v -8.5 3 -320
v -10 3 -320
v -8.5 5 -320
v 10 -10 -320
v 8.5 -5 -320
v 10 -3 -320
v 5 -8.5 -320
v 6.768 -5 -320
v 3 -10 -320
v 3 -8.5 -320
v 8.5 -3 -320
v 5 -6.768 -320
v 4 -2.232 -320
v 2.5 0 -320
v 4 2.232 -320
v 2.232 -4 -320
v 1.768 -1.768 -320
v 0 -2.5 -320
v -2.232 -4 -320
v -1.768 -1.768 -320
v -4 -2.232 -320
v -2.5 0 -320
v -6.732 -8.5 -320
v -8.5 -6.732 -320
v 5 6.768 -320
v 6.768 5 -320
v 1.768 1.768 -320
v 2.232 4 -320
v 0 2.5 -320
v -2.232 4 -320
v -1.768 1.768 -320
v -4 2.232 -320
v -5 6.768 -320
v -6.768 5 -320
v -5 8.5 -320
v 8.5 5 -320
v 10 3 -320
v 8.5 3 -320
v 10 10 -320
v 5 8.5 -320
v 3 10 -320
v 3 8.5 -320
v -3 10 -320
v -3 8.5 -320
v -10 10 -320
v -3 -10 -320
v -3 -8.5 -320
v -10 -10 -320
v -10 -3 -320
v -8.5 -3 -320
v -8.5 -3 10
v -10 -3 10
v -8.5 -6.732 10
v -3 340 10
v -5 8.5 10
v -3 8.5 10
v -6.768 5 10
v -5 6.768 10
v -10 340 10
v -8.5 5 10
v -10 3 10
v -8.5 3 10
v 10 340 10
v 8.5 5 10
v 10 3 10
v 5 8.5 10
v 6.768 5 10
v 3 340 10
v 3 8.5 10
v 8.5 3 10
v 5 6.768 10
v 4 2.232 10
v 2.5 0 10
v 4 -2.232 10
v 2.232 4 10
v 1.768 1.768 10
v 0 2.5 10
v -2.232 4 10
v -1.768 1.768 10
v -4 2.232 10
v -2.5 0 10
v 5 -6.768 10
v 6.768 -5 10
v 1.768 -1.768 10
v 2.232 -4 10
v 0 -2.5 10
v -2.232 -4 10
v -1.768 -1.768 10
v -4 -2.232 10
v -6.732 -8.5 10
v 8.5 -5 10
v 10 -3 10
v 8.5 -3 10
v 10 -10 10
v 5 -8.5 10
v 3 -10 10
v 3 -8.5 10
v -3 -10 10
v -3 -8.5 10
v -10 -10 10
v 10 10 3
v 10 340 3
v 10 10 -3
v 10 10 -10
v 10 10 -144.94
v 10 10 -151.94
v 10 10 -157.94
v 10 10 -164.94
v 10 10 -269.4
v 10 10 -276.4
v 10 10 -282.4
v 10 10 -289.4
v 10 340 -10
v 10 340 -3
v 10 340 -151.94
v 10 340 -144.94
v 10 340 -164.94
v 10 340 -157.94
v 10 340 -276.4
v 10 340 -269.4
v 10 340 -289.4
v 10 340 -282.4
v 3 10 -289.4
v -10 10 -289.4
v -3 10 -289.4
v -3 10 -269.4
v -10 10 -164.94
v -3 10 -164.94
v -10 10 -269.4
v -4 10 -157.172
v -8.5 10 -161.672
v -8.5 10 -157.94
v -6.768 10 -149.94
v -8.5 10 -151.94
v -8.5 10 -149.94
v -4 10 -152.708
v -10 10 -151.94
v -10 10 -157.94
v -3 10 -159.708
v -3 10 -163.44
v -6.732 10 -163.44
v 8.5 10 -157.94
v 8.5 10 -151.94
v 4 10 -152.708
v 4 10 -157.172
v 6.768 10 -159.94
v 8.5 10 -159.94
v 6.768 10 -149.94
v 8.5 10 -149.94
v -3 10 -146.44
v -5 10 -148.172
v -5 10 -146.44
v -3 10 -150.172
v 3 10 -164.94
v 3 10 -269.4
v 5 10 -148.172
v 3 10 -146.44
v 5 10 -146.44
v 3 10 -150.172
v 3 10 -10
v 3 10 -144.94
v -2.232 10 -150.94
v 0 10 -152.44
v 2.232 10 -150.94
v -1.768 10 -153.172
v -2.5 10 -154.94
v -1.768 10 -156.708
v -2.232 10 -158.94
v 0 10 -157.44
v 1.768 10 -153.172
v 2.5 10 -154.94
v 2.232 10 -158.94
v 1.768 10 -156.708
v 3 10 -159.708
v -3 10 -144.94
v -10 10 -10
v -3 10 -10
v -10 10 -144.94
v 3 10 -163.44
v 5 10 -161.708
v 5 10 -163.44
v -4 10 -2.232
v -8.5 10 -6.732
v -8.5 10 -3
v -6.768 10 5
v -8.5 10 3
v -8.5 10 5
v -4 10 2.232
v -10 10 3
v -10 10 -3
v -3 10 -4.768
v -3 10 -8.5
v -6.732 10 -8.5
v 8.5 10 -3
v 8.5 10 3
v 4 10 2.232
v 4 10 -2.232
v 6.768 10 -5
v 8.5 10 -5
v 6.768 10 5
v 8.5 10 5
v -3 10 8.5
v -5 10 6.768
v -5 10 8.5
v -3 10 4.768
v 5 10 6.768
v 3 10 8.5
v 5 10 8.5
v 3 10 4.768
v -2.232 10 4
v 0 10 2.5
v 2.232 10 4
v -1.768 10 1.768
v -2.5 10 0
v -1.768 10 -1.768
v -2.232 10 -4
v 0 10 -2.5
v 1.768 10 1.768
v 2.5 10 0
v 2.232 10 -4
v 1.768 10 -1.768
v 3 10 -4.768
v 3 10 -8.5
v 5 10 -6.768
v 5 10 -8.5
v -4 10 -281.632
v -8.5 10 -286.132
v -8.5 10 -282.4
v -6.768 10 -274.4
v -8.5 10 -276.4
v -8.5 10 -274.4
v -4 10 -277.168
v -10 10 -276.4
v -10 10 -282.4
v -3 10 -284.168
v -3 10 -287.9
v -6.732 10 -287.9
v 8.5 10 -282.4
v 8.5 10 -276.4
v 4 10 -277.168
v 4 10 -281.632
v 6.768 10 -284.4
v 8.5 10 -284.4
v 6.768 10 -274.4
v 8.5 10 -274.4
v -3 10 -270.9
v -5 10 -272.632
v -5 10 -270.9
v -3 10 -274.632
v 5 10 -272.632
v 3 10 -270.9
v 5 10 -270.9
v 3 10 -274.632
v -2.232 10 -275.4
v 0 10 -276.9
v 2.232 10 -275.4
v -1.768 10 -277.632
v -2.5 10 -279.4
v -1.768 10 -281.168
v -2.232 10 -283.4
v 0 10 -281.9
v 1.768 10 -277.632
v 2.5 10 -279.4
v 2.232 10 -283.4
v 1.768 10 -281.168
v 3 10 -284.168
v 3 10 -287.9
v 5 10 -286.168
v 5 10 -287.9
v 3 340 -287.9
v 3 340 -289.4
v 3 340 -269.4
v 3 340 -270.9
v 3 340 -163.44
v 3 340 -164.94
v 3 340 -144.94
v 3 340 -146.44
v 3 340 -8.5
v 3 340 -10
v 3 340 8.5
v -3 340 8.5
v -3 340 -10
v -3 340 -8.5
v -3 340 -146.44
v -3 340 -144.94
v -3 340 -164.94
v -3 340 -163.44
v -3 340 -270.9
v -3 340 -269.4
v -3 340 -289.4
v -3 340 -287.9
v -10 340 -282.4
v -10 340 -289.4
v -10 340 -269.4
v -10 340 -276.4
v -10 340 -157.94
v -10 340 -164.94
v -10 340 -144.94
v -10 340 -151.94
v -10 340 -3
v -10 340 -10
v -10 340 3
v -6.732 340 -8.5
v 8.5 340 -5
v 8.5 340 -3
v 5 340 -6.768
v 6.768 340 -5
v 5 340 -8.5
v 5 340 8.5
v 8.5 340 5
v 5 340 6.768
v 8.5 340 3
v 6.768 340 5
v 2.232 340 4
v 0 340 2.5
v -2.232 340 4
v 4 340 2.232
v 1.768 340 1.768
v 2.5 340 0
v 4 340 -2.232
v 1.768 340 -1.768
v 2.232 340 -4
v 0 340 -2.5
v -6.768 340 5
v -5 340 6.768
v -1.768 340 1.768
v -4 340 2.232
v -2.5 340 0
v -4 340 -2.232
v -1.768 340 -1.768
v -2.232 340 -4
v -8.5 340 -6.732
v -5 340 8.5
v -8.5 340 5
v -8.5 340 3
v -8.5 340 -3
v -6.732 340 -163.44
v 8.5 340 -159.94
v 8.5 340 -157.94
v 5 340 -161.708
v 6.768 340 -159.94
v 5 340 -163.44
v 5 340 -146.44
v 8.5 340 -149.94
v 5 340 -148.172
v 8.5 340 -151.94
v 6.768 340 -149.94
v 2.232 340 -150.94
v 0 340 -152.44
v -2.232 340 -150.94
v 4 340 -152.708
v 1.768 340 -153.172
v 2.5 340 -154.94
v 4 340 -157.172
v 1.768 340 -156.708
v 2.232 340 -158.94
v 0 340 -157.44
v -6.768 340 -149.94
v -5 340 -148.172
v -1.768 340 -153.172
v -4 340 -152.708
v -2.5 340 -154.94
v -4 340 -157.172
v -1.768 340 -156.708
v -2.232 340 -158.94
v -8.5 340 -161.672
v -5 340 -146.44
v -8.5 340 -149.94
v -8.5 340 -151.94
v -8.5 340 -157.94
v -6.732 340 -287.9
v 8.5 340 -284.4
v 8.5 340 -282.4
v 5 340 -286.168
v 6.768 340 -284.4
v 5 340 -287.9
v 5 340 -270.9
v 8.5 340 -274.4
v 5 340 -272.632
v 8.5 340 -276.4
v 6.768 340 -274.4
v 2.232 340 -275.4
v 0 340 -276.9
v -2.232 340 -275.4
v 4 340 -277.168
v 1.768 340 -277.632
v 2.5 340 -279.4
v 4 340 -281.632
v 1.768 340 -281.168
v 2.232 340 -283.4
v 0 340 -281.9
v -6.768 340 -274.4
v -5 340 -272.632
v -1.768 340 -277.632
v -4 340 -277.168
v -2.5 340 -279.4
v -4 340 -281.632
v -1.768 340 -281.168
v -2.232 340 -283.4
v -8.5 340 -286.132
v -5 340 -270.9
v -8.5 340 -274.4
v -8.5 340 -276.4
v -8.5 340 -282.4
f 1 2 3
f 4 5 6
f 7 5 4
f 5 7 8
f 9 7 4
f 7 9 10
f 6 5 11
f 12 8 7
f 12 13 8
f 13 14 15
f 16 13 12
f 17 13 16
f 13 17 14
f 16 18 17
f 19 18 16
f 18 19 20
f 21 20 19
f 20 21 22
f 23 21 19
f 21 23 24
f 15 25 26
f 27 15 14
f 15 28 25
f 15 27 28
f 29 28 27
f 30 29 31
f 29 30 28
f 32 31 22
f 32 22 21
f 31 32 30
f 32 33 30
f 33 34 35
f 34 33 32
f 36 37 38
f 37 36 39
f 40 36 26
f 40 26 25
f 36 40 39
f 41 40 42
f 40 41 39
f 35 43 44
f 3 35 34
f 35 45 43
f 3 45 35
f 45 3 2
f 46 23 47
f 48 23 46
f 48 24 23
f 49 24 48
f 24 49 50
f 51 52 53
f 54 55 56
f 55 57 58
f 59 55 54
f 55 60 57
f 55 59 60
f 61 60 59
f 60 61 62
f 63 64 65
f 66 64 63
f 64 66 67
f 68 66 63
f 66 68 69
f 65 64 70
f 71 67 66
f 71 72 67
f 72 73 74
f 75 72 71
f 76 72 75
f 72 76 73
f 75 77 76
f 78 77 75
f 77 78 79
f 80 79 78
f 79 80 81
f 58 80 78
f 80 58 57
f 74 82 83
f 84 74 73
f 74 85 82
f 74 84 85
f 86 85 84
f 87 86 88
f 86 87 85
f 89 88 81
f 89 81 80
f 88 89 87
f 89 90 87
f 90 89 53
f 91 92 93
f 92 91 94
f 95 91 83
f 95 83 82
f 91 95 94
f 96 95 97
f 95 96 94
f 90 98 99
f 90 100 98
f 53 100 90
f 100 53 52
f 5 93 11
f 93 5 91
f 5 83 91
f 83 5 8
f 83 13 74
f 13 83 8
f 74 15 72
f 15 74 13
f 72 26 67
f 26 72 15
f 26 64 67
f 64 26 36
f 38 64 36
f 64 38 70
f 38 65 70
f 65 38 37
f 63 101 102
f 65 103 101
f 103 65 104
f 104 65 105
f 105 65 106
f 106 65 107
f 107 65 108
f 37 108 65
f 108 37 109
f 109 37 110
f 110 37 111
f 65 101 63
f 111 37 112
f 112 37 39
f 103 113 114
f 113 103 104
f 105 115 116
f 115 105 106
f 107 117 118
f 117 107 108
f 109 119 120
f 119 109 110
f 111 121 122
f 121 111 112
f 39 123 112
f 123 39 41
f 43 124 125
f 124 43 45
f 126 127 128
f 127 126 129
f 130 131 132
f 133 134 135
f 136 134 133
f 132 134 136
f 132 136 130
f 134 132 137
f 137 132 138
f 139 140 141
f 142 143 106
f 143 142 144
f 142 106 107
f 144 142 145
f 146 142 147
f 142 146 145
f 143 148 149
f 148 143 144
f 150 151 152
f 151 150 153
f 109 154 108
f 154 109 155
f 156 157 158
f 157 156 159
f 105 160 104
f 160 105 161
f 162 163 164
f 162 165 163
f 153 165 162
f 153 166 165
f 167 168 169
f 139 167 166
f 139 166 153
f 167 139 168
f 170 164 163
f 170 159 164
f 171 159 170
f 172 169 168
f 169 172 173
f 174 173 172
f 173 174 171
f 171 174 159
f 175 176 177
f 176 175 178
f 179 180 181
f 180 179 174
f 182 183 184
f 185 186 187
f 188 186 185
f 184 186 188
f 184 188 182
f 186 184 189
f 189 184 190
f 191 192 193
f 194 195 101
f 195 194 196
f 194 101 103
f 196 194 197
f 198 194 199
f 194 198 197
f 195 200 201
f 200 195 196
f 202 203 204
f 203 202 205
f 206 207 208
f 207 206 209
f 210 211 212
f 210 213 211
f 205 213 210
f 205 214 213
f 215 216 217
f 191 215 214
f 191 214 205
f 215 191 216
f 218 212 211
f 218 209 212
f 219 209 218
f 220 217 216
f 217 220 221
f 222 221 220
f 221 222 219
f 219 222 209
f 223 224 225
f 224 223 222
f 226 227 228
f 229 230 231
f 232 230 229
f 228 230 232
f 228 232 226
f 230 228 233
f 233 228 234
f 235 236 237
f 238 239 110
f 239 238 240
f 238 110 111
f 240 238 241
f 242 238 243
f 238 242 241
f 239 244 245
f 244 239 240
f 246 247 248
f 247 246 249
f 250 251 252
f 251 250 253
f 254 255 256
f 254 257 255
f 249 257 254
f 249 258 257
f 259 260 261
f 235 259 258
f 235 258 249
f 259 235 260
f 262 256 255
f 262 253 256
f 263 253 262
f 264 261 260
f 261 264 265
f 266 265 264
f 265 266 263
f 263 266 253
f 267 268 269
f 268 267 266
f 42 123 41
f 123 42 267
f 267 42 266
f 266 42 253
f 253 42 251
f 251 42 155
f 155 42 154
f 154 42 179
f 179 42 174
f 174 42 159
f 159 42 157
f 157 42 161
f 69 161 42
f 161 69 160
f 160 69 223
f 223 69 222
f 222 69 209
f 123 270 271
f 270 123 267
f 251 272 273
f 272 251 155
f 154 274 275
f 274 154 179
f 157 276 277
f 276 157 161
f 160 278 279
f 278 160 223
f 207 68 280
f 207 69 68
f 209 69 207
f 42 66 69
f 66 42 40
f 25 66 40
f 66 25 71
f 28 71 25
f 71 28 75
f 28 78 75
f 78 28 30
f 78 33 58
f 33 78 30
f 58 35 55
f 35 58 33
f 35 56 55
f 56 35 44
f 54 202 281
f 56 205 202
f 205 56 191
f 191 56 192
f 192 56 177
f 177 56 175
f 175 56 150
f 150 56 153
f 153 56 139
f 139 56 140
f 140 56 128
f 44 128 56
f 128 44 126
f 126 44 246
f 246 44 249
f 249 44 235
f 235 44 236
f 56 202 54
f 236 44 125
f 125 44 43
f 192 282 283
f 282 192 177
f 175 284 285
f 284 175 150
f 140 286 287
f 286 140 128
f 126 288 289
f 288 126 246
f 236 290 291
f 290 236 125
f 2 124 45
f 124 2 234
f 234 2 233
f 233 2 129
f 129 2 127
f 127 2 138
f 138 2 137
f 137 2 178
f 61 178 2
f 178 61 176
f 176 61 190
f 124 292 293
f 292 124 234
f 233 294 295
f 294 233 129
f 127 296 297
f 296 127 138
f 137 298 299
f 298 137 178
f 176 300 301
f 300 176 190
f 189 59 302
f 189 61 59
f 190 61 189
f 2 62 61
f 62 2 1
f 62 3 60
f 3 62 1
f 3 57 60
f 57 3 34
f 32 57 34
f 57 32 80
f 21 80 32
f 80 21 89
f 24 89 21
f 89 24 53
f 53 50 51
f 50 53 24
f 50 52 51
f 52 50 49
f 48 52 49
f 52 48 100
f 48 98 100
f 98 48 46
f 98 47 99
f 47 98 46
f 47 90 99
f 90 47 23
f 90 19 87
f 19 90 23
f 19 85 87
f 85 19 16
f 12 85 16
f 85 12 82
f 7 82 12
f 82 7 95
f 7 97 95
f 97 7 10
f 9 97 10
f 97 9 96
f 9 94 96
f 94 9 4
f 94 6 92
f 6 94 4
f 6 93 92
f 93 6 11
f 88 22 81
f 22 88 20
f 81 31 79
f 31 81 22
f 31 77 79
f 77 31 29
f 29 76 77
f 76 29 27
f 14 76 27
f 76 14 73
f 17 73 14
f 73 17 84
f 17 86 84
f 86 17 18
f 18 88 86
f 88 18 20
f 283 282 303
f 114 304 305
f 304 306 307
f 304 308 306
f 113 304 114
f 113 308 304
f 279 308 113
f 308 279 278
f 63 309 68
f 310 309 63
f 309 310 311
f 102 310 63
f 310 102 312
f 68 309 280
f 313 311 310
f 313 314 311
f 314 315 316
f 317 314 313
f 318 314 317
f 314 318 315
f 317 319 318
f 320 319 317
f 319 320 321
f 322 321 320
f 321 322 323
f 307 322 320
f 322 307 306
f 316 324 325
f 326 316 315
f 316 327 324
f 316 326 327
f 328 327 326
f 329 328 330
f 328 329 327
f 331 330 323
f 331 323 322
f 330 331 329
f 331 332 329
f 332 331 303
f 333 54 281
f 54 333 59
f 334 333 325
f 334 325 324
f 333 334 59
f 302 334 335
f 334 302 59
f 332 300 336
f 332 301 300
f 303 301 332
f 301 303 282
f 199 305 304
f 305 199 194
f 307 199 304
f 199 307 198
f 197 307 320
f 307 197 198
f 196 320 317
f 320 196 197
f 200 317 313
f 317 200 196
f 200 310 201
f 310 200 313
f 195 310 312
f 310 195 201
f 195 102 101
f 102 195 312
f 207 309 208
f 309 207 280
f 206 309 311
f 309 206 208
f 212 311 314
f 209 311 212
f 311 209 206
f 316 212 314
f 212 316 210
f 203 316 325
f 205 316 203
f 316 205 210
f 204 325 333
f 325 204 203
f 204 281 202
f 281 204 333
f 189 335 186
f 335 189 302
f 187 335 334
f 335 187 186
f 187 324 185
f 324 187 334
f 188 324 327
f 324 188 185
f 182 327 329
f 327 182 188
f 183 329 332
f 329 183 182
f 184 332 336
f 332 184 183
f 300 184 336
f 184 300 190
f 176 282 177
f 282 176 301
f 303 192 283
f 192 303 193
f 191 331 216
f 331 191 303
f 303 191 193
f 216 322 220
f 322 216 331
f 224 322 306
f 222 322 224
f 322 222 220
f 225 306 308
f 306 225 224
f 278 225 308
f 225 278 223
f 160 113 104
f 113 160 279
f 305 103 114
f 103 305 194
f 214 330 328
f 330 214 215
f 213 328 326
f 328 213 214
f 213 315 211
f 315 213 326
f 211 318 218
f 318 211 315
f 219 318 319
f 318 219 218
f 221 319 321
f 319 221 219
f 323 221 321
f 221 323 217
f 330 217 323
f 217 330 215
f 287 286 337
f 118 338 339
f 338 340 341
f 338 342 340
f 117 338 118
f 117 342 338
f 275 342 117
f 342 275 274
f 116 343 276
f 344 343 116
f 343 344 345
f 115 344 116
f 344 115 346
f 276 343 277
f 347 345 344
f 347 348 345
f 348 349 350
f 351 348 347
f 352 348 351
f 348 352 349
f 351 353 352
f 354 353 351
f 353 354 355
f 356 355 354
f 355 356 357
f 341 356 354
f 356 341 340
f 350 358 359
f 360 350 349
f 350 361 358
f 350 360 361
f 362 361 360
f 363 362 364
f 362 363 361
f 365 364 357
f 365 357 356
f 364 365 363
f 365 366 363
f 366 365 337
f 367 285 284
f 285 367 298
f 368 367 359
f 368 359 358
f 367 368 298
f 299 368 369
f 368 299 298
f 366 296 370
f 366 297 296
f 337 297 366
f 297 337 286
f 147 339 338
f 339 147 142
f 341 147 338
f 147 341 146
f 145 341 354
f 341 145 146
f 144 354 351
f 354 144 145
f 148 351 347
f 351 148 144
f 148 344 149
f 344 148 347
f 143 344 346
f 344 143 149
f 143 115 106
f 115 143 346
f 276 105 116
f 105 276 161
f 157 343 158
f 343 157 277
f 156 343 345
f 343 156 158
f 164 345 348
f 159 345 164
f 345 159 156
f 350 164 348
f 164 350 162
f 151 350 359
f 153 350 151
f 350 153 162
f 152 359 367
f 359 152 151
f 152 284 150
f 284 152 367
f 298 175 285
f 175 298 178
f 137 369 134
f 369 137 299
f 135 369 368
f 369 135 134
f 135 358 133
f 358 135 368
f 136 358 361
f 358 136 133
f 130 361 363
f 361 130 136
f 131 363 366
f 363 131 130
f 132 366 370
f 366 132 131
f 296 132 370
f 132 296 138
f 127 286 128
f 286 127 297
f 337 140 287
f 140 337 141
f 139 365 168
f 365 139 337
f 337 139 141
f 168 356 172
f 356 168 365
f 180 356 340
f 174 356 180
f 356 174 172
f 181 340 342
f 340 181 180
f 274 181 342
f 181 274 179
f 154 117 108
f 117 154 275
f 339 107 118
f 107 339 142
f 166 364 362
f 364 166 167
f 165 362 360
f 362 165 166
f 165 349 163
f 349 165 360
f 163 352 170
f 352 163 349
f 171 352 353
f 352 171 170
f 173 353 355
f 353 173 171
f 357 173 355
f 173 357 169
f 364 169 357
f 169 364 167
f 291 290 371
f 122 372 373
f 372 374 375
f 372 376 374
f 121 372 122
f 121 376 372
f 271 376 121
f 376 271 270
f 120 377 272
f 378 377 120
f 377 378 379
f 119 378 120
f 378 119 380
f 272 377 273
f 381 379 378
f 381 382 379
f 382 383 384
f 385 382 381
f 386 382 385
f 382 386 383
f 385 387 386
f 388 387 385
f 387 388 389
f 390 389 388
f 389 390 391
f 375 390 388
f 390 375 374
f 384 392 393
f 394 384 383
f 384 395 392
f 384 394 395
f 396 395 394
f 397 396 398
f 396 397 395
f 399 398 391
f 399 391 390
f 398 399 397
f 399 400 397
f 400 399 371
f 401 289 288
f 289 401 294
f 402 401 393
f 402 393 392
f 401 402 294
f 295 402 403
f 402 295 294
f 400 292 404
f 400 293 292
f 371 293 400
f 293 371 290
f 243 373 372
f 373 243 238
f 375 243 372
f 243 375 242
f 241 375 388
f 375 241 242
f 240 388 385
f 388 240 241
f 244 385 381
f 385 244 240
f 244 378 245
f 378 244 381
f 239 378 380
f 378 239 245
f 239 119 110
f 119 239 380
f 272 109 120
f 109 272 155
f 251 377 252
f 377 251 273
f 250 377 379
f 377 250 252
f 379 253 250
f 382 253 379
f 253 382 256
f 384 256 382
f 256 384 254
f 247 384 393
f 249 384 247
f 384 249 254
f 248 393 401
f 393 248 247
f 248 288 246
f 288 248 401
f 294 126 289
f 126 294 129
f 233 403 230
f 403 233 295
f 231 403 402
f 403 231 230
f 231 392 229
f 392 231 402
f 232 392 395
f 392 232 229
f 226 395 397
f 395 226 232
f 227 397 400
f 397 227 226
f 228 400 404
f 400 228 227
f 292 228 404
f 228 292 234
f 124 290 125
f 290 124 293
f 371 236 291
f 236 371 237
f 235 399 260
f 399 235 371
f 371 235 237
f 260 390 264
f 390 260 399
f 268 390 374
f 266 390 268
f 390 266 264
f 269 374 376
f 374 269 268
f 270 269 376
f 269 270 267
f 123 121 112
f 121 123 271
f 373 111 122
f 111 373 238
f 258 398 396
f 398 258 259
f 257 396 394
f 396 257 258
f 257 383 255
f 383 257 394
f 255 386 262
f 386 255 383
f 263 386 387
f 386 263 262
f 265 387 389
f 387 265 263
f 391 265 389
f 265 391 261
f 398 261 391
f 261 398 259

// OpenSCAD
// file: connectors.scad
module tslide(length, width, height, top_length, top_width, top_height,
              bottom_width, slope_height, screw_diameter, center = false) {
    module base() {
        rotate([90, 0, 90]) union() {
            linear_extrude(height = length) polygon(
                points =
                    [
                        // 0
                        [ width - (width - bottom_width) / 2, 0 ],
                        // 4
                        [ width, slope_height ],
                        // 8
                        [ width, height - top_height ],
                        // 11
                        [ 0, height - top_height ],
                        // 7
                        [ 0, slope_height ],
                        // 3
                        [ (width - bottom_width) / 2, 0 ]
                    ]);
            translate([0, 0, (length - top_length) / 2]) linear_extrude(height = top_length) polygon(
                points =
                    [
                        // 0
                        [
                            width - (width - top_width) / 2, 
                            height - top_height
                        ],
                        // 3
                        [
                            (width - top_width) / 2,
                            height - top_height
                        ],
                        // 7
                        [
                            (width - top_width) / 2,
                            height
                        ],
                        // 4
                        [
                            width - (width - top_width) / 2,
                            height
                        ]                        
                    ]
            );
        }
    }
    difference() {
        if (center) {
            translate([ -length / 2, -width / 2, -height / 2 ]) {
                base();
            }
        } else {
            base();
        }
        if (center) {
            cylinder(h = height, d = screw_diameter, center = true);
        } else {
            translate([ length / 2, width / 2, 0 ]) {
                cylinder(h = height, d = screw_diameter);
            }
        }
    }
}
// main file
include<extrusions.scad>

include<connectors.scad>

sidelen = 20;
notch = 6;
border_thickness = 1.5;
arm_thickness = 2.5;
center_diameter = 5;
center_sidelen = 8;
corner_inner = 0;
corner_outer = 5.0;

vchassie_len = 330;

translate([0, 0, -vchassie_len / 2 + sidelen / 2])
extrusion(sidelen = sidelen, height = vchassie_len, notch = notch,
                      border_thickness = border_thickness,
                      arm_thickness = arm_thickness,
                      center_diameter = center_diameter,
                      center_sidelen = center_sidelen,
                      corner_inner = corner_inner, corner_outer = corner_outer,
                      center = true);


hchassie_len = 330;

translate([ 0, hchassie_len / 2 + sidelen / 2, 0])
rotate([90, 0, 0])
extrusion(sidelen = sidelen, height = hchassie_len, notch = notch,
                      border_thickness = border_thickness,
                      arm_thickness = arm_thickness,
                      center_diameter = center_diameter,
                      center_sidelen = center_sidelen,
                      corner_inner = corner_inner, corner_outer = corner_outer,
                      center = true);

translate([0, hchassie_len / 2 + sidelen / 2, -154.94])
rotate([90, 0, 0])
extrusion(sidelen = sidelen, height = hchassie_len, notch = notch,
                      border_thickness = border_thickness,
                      arm_thickness = arm_thickness,
                      center_diameter = center_diameter,
                      center_sidelen = center_sidelen,
                      corner_inner = corner_inner, corner_outer = corner_outer,
                      center = true);


translate([0, hchassie_len / 2 + sidelen / 2, -279.4])
rotate([90, 0, 0])
extrusion(sidelen = sidelen, height = hchassie_len, notch = notch,
                      border_thickness = border_thickness,
                      arm_thickness = arm_thickness,
                      center_diameter = center_diameter,
                      center_sidelen = center_sidelen,
                      corner_inner = corner_inner, corner_outer = corner_outer,
                      center = true);
